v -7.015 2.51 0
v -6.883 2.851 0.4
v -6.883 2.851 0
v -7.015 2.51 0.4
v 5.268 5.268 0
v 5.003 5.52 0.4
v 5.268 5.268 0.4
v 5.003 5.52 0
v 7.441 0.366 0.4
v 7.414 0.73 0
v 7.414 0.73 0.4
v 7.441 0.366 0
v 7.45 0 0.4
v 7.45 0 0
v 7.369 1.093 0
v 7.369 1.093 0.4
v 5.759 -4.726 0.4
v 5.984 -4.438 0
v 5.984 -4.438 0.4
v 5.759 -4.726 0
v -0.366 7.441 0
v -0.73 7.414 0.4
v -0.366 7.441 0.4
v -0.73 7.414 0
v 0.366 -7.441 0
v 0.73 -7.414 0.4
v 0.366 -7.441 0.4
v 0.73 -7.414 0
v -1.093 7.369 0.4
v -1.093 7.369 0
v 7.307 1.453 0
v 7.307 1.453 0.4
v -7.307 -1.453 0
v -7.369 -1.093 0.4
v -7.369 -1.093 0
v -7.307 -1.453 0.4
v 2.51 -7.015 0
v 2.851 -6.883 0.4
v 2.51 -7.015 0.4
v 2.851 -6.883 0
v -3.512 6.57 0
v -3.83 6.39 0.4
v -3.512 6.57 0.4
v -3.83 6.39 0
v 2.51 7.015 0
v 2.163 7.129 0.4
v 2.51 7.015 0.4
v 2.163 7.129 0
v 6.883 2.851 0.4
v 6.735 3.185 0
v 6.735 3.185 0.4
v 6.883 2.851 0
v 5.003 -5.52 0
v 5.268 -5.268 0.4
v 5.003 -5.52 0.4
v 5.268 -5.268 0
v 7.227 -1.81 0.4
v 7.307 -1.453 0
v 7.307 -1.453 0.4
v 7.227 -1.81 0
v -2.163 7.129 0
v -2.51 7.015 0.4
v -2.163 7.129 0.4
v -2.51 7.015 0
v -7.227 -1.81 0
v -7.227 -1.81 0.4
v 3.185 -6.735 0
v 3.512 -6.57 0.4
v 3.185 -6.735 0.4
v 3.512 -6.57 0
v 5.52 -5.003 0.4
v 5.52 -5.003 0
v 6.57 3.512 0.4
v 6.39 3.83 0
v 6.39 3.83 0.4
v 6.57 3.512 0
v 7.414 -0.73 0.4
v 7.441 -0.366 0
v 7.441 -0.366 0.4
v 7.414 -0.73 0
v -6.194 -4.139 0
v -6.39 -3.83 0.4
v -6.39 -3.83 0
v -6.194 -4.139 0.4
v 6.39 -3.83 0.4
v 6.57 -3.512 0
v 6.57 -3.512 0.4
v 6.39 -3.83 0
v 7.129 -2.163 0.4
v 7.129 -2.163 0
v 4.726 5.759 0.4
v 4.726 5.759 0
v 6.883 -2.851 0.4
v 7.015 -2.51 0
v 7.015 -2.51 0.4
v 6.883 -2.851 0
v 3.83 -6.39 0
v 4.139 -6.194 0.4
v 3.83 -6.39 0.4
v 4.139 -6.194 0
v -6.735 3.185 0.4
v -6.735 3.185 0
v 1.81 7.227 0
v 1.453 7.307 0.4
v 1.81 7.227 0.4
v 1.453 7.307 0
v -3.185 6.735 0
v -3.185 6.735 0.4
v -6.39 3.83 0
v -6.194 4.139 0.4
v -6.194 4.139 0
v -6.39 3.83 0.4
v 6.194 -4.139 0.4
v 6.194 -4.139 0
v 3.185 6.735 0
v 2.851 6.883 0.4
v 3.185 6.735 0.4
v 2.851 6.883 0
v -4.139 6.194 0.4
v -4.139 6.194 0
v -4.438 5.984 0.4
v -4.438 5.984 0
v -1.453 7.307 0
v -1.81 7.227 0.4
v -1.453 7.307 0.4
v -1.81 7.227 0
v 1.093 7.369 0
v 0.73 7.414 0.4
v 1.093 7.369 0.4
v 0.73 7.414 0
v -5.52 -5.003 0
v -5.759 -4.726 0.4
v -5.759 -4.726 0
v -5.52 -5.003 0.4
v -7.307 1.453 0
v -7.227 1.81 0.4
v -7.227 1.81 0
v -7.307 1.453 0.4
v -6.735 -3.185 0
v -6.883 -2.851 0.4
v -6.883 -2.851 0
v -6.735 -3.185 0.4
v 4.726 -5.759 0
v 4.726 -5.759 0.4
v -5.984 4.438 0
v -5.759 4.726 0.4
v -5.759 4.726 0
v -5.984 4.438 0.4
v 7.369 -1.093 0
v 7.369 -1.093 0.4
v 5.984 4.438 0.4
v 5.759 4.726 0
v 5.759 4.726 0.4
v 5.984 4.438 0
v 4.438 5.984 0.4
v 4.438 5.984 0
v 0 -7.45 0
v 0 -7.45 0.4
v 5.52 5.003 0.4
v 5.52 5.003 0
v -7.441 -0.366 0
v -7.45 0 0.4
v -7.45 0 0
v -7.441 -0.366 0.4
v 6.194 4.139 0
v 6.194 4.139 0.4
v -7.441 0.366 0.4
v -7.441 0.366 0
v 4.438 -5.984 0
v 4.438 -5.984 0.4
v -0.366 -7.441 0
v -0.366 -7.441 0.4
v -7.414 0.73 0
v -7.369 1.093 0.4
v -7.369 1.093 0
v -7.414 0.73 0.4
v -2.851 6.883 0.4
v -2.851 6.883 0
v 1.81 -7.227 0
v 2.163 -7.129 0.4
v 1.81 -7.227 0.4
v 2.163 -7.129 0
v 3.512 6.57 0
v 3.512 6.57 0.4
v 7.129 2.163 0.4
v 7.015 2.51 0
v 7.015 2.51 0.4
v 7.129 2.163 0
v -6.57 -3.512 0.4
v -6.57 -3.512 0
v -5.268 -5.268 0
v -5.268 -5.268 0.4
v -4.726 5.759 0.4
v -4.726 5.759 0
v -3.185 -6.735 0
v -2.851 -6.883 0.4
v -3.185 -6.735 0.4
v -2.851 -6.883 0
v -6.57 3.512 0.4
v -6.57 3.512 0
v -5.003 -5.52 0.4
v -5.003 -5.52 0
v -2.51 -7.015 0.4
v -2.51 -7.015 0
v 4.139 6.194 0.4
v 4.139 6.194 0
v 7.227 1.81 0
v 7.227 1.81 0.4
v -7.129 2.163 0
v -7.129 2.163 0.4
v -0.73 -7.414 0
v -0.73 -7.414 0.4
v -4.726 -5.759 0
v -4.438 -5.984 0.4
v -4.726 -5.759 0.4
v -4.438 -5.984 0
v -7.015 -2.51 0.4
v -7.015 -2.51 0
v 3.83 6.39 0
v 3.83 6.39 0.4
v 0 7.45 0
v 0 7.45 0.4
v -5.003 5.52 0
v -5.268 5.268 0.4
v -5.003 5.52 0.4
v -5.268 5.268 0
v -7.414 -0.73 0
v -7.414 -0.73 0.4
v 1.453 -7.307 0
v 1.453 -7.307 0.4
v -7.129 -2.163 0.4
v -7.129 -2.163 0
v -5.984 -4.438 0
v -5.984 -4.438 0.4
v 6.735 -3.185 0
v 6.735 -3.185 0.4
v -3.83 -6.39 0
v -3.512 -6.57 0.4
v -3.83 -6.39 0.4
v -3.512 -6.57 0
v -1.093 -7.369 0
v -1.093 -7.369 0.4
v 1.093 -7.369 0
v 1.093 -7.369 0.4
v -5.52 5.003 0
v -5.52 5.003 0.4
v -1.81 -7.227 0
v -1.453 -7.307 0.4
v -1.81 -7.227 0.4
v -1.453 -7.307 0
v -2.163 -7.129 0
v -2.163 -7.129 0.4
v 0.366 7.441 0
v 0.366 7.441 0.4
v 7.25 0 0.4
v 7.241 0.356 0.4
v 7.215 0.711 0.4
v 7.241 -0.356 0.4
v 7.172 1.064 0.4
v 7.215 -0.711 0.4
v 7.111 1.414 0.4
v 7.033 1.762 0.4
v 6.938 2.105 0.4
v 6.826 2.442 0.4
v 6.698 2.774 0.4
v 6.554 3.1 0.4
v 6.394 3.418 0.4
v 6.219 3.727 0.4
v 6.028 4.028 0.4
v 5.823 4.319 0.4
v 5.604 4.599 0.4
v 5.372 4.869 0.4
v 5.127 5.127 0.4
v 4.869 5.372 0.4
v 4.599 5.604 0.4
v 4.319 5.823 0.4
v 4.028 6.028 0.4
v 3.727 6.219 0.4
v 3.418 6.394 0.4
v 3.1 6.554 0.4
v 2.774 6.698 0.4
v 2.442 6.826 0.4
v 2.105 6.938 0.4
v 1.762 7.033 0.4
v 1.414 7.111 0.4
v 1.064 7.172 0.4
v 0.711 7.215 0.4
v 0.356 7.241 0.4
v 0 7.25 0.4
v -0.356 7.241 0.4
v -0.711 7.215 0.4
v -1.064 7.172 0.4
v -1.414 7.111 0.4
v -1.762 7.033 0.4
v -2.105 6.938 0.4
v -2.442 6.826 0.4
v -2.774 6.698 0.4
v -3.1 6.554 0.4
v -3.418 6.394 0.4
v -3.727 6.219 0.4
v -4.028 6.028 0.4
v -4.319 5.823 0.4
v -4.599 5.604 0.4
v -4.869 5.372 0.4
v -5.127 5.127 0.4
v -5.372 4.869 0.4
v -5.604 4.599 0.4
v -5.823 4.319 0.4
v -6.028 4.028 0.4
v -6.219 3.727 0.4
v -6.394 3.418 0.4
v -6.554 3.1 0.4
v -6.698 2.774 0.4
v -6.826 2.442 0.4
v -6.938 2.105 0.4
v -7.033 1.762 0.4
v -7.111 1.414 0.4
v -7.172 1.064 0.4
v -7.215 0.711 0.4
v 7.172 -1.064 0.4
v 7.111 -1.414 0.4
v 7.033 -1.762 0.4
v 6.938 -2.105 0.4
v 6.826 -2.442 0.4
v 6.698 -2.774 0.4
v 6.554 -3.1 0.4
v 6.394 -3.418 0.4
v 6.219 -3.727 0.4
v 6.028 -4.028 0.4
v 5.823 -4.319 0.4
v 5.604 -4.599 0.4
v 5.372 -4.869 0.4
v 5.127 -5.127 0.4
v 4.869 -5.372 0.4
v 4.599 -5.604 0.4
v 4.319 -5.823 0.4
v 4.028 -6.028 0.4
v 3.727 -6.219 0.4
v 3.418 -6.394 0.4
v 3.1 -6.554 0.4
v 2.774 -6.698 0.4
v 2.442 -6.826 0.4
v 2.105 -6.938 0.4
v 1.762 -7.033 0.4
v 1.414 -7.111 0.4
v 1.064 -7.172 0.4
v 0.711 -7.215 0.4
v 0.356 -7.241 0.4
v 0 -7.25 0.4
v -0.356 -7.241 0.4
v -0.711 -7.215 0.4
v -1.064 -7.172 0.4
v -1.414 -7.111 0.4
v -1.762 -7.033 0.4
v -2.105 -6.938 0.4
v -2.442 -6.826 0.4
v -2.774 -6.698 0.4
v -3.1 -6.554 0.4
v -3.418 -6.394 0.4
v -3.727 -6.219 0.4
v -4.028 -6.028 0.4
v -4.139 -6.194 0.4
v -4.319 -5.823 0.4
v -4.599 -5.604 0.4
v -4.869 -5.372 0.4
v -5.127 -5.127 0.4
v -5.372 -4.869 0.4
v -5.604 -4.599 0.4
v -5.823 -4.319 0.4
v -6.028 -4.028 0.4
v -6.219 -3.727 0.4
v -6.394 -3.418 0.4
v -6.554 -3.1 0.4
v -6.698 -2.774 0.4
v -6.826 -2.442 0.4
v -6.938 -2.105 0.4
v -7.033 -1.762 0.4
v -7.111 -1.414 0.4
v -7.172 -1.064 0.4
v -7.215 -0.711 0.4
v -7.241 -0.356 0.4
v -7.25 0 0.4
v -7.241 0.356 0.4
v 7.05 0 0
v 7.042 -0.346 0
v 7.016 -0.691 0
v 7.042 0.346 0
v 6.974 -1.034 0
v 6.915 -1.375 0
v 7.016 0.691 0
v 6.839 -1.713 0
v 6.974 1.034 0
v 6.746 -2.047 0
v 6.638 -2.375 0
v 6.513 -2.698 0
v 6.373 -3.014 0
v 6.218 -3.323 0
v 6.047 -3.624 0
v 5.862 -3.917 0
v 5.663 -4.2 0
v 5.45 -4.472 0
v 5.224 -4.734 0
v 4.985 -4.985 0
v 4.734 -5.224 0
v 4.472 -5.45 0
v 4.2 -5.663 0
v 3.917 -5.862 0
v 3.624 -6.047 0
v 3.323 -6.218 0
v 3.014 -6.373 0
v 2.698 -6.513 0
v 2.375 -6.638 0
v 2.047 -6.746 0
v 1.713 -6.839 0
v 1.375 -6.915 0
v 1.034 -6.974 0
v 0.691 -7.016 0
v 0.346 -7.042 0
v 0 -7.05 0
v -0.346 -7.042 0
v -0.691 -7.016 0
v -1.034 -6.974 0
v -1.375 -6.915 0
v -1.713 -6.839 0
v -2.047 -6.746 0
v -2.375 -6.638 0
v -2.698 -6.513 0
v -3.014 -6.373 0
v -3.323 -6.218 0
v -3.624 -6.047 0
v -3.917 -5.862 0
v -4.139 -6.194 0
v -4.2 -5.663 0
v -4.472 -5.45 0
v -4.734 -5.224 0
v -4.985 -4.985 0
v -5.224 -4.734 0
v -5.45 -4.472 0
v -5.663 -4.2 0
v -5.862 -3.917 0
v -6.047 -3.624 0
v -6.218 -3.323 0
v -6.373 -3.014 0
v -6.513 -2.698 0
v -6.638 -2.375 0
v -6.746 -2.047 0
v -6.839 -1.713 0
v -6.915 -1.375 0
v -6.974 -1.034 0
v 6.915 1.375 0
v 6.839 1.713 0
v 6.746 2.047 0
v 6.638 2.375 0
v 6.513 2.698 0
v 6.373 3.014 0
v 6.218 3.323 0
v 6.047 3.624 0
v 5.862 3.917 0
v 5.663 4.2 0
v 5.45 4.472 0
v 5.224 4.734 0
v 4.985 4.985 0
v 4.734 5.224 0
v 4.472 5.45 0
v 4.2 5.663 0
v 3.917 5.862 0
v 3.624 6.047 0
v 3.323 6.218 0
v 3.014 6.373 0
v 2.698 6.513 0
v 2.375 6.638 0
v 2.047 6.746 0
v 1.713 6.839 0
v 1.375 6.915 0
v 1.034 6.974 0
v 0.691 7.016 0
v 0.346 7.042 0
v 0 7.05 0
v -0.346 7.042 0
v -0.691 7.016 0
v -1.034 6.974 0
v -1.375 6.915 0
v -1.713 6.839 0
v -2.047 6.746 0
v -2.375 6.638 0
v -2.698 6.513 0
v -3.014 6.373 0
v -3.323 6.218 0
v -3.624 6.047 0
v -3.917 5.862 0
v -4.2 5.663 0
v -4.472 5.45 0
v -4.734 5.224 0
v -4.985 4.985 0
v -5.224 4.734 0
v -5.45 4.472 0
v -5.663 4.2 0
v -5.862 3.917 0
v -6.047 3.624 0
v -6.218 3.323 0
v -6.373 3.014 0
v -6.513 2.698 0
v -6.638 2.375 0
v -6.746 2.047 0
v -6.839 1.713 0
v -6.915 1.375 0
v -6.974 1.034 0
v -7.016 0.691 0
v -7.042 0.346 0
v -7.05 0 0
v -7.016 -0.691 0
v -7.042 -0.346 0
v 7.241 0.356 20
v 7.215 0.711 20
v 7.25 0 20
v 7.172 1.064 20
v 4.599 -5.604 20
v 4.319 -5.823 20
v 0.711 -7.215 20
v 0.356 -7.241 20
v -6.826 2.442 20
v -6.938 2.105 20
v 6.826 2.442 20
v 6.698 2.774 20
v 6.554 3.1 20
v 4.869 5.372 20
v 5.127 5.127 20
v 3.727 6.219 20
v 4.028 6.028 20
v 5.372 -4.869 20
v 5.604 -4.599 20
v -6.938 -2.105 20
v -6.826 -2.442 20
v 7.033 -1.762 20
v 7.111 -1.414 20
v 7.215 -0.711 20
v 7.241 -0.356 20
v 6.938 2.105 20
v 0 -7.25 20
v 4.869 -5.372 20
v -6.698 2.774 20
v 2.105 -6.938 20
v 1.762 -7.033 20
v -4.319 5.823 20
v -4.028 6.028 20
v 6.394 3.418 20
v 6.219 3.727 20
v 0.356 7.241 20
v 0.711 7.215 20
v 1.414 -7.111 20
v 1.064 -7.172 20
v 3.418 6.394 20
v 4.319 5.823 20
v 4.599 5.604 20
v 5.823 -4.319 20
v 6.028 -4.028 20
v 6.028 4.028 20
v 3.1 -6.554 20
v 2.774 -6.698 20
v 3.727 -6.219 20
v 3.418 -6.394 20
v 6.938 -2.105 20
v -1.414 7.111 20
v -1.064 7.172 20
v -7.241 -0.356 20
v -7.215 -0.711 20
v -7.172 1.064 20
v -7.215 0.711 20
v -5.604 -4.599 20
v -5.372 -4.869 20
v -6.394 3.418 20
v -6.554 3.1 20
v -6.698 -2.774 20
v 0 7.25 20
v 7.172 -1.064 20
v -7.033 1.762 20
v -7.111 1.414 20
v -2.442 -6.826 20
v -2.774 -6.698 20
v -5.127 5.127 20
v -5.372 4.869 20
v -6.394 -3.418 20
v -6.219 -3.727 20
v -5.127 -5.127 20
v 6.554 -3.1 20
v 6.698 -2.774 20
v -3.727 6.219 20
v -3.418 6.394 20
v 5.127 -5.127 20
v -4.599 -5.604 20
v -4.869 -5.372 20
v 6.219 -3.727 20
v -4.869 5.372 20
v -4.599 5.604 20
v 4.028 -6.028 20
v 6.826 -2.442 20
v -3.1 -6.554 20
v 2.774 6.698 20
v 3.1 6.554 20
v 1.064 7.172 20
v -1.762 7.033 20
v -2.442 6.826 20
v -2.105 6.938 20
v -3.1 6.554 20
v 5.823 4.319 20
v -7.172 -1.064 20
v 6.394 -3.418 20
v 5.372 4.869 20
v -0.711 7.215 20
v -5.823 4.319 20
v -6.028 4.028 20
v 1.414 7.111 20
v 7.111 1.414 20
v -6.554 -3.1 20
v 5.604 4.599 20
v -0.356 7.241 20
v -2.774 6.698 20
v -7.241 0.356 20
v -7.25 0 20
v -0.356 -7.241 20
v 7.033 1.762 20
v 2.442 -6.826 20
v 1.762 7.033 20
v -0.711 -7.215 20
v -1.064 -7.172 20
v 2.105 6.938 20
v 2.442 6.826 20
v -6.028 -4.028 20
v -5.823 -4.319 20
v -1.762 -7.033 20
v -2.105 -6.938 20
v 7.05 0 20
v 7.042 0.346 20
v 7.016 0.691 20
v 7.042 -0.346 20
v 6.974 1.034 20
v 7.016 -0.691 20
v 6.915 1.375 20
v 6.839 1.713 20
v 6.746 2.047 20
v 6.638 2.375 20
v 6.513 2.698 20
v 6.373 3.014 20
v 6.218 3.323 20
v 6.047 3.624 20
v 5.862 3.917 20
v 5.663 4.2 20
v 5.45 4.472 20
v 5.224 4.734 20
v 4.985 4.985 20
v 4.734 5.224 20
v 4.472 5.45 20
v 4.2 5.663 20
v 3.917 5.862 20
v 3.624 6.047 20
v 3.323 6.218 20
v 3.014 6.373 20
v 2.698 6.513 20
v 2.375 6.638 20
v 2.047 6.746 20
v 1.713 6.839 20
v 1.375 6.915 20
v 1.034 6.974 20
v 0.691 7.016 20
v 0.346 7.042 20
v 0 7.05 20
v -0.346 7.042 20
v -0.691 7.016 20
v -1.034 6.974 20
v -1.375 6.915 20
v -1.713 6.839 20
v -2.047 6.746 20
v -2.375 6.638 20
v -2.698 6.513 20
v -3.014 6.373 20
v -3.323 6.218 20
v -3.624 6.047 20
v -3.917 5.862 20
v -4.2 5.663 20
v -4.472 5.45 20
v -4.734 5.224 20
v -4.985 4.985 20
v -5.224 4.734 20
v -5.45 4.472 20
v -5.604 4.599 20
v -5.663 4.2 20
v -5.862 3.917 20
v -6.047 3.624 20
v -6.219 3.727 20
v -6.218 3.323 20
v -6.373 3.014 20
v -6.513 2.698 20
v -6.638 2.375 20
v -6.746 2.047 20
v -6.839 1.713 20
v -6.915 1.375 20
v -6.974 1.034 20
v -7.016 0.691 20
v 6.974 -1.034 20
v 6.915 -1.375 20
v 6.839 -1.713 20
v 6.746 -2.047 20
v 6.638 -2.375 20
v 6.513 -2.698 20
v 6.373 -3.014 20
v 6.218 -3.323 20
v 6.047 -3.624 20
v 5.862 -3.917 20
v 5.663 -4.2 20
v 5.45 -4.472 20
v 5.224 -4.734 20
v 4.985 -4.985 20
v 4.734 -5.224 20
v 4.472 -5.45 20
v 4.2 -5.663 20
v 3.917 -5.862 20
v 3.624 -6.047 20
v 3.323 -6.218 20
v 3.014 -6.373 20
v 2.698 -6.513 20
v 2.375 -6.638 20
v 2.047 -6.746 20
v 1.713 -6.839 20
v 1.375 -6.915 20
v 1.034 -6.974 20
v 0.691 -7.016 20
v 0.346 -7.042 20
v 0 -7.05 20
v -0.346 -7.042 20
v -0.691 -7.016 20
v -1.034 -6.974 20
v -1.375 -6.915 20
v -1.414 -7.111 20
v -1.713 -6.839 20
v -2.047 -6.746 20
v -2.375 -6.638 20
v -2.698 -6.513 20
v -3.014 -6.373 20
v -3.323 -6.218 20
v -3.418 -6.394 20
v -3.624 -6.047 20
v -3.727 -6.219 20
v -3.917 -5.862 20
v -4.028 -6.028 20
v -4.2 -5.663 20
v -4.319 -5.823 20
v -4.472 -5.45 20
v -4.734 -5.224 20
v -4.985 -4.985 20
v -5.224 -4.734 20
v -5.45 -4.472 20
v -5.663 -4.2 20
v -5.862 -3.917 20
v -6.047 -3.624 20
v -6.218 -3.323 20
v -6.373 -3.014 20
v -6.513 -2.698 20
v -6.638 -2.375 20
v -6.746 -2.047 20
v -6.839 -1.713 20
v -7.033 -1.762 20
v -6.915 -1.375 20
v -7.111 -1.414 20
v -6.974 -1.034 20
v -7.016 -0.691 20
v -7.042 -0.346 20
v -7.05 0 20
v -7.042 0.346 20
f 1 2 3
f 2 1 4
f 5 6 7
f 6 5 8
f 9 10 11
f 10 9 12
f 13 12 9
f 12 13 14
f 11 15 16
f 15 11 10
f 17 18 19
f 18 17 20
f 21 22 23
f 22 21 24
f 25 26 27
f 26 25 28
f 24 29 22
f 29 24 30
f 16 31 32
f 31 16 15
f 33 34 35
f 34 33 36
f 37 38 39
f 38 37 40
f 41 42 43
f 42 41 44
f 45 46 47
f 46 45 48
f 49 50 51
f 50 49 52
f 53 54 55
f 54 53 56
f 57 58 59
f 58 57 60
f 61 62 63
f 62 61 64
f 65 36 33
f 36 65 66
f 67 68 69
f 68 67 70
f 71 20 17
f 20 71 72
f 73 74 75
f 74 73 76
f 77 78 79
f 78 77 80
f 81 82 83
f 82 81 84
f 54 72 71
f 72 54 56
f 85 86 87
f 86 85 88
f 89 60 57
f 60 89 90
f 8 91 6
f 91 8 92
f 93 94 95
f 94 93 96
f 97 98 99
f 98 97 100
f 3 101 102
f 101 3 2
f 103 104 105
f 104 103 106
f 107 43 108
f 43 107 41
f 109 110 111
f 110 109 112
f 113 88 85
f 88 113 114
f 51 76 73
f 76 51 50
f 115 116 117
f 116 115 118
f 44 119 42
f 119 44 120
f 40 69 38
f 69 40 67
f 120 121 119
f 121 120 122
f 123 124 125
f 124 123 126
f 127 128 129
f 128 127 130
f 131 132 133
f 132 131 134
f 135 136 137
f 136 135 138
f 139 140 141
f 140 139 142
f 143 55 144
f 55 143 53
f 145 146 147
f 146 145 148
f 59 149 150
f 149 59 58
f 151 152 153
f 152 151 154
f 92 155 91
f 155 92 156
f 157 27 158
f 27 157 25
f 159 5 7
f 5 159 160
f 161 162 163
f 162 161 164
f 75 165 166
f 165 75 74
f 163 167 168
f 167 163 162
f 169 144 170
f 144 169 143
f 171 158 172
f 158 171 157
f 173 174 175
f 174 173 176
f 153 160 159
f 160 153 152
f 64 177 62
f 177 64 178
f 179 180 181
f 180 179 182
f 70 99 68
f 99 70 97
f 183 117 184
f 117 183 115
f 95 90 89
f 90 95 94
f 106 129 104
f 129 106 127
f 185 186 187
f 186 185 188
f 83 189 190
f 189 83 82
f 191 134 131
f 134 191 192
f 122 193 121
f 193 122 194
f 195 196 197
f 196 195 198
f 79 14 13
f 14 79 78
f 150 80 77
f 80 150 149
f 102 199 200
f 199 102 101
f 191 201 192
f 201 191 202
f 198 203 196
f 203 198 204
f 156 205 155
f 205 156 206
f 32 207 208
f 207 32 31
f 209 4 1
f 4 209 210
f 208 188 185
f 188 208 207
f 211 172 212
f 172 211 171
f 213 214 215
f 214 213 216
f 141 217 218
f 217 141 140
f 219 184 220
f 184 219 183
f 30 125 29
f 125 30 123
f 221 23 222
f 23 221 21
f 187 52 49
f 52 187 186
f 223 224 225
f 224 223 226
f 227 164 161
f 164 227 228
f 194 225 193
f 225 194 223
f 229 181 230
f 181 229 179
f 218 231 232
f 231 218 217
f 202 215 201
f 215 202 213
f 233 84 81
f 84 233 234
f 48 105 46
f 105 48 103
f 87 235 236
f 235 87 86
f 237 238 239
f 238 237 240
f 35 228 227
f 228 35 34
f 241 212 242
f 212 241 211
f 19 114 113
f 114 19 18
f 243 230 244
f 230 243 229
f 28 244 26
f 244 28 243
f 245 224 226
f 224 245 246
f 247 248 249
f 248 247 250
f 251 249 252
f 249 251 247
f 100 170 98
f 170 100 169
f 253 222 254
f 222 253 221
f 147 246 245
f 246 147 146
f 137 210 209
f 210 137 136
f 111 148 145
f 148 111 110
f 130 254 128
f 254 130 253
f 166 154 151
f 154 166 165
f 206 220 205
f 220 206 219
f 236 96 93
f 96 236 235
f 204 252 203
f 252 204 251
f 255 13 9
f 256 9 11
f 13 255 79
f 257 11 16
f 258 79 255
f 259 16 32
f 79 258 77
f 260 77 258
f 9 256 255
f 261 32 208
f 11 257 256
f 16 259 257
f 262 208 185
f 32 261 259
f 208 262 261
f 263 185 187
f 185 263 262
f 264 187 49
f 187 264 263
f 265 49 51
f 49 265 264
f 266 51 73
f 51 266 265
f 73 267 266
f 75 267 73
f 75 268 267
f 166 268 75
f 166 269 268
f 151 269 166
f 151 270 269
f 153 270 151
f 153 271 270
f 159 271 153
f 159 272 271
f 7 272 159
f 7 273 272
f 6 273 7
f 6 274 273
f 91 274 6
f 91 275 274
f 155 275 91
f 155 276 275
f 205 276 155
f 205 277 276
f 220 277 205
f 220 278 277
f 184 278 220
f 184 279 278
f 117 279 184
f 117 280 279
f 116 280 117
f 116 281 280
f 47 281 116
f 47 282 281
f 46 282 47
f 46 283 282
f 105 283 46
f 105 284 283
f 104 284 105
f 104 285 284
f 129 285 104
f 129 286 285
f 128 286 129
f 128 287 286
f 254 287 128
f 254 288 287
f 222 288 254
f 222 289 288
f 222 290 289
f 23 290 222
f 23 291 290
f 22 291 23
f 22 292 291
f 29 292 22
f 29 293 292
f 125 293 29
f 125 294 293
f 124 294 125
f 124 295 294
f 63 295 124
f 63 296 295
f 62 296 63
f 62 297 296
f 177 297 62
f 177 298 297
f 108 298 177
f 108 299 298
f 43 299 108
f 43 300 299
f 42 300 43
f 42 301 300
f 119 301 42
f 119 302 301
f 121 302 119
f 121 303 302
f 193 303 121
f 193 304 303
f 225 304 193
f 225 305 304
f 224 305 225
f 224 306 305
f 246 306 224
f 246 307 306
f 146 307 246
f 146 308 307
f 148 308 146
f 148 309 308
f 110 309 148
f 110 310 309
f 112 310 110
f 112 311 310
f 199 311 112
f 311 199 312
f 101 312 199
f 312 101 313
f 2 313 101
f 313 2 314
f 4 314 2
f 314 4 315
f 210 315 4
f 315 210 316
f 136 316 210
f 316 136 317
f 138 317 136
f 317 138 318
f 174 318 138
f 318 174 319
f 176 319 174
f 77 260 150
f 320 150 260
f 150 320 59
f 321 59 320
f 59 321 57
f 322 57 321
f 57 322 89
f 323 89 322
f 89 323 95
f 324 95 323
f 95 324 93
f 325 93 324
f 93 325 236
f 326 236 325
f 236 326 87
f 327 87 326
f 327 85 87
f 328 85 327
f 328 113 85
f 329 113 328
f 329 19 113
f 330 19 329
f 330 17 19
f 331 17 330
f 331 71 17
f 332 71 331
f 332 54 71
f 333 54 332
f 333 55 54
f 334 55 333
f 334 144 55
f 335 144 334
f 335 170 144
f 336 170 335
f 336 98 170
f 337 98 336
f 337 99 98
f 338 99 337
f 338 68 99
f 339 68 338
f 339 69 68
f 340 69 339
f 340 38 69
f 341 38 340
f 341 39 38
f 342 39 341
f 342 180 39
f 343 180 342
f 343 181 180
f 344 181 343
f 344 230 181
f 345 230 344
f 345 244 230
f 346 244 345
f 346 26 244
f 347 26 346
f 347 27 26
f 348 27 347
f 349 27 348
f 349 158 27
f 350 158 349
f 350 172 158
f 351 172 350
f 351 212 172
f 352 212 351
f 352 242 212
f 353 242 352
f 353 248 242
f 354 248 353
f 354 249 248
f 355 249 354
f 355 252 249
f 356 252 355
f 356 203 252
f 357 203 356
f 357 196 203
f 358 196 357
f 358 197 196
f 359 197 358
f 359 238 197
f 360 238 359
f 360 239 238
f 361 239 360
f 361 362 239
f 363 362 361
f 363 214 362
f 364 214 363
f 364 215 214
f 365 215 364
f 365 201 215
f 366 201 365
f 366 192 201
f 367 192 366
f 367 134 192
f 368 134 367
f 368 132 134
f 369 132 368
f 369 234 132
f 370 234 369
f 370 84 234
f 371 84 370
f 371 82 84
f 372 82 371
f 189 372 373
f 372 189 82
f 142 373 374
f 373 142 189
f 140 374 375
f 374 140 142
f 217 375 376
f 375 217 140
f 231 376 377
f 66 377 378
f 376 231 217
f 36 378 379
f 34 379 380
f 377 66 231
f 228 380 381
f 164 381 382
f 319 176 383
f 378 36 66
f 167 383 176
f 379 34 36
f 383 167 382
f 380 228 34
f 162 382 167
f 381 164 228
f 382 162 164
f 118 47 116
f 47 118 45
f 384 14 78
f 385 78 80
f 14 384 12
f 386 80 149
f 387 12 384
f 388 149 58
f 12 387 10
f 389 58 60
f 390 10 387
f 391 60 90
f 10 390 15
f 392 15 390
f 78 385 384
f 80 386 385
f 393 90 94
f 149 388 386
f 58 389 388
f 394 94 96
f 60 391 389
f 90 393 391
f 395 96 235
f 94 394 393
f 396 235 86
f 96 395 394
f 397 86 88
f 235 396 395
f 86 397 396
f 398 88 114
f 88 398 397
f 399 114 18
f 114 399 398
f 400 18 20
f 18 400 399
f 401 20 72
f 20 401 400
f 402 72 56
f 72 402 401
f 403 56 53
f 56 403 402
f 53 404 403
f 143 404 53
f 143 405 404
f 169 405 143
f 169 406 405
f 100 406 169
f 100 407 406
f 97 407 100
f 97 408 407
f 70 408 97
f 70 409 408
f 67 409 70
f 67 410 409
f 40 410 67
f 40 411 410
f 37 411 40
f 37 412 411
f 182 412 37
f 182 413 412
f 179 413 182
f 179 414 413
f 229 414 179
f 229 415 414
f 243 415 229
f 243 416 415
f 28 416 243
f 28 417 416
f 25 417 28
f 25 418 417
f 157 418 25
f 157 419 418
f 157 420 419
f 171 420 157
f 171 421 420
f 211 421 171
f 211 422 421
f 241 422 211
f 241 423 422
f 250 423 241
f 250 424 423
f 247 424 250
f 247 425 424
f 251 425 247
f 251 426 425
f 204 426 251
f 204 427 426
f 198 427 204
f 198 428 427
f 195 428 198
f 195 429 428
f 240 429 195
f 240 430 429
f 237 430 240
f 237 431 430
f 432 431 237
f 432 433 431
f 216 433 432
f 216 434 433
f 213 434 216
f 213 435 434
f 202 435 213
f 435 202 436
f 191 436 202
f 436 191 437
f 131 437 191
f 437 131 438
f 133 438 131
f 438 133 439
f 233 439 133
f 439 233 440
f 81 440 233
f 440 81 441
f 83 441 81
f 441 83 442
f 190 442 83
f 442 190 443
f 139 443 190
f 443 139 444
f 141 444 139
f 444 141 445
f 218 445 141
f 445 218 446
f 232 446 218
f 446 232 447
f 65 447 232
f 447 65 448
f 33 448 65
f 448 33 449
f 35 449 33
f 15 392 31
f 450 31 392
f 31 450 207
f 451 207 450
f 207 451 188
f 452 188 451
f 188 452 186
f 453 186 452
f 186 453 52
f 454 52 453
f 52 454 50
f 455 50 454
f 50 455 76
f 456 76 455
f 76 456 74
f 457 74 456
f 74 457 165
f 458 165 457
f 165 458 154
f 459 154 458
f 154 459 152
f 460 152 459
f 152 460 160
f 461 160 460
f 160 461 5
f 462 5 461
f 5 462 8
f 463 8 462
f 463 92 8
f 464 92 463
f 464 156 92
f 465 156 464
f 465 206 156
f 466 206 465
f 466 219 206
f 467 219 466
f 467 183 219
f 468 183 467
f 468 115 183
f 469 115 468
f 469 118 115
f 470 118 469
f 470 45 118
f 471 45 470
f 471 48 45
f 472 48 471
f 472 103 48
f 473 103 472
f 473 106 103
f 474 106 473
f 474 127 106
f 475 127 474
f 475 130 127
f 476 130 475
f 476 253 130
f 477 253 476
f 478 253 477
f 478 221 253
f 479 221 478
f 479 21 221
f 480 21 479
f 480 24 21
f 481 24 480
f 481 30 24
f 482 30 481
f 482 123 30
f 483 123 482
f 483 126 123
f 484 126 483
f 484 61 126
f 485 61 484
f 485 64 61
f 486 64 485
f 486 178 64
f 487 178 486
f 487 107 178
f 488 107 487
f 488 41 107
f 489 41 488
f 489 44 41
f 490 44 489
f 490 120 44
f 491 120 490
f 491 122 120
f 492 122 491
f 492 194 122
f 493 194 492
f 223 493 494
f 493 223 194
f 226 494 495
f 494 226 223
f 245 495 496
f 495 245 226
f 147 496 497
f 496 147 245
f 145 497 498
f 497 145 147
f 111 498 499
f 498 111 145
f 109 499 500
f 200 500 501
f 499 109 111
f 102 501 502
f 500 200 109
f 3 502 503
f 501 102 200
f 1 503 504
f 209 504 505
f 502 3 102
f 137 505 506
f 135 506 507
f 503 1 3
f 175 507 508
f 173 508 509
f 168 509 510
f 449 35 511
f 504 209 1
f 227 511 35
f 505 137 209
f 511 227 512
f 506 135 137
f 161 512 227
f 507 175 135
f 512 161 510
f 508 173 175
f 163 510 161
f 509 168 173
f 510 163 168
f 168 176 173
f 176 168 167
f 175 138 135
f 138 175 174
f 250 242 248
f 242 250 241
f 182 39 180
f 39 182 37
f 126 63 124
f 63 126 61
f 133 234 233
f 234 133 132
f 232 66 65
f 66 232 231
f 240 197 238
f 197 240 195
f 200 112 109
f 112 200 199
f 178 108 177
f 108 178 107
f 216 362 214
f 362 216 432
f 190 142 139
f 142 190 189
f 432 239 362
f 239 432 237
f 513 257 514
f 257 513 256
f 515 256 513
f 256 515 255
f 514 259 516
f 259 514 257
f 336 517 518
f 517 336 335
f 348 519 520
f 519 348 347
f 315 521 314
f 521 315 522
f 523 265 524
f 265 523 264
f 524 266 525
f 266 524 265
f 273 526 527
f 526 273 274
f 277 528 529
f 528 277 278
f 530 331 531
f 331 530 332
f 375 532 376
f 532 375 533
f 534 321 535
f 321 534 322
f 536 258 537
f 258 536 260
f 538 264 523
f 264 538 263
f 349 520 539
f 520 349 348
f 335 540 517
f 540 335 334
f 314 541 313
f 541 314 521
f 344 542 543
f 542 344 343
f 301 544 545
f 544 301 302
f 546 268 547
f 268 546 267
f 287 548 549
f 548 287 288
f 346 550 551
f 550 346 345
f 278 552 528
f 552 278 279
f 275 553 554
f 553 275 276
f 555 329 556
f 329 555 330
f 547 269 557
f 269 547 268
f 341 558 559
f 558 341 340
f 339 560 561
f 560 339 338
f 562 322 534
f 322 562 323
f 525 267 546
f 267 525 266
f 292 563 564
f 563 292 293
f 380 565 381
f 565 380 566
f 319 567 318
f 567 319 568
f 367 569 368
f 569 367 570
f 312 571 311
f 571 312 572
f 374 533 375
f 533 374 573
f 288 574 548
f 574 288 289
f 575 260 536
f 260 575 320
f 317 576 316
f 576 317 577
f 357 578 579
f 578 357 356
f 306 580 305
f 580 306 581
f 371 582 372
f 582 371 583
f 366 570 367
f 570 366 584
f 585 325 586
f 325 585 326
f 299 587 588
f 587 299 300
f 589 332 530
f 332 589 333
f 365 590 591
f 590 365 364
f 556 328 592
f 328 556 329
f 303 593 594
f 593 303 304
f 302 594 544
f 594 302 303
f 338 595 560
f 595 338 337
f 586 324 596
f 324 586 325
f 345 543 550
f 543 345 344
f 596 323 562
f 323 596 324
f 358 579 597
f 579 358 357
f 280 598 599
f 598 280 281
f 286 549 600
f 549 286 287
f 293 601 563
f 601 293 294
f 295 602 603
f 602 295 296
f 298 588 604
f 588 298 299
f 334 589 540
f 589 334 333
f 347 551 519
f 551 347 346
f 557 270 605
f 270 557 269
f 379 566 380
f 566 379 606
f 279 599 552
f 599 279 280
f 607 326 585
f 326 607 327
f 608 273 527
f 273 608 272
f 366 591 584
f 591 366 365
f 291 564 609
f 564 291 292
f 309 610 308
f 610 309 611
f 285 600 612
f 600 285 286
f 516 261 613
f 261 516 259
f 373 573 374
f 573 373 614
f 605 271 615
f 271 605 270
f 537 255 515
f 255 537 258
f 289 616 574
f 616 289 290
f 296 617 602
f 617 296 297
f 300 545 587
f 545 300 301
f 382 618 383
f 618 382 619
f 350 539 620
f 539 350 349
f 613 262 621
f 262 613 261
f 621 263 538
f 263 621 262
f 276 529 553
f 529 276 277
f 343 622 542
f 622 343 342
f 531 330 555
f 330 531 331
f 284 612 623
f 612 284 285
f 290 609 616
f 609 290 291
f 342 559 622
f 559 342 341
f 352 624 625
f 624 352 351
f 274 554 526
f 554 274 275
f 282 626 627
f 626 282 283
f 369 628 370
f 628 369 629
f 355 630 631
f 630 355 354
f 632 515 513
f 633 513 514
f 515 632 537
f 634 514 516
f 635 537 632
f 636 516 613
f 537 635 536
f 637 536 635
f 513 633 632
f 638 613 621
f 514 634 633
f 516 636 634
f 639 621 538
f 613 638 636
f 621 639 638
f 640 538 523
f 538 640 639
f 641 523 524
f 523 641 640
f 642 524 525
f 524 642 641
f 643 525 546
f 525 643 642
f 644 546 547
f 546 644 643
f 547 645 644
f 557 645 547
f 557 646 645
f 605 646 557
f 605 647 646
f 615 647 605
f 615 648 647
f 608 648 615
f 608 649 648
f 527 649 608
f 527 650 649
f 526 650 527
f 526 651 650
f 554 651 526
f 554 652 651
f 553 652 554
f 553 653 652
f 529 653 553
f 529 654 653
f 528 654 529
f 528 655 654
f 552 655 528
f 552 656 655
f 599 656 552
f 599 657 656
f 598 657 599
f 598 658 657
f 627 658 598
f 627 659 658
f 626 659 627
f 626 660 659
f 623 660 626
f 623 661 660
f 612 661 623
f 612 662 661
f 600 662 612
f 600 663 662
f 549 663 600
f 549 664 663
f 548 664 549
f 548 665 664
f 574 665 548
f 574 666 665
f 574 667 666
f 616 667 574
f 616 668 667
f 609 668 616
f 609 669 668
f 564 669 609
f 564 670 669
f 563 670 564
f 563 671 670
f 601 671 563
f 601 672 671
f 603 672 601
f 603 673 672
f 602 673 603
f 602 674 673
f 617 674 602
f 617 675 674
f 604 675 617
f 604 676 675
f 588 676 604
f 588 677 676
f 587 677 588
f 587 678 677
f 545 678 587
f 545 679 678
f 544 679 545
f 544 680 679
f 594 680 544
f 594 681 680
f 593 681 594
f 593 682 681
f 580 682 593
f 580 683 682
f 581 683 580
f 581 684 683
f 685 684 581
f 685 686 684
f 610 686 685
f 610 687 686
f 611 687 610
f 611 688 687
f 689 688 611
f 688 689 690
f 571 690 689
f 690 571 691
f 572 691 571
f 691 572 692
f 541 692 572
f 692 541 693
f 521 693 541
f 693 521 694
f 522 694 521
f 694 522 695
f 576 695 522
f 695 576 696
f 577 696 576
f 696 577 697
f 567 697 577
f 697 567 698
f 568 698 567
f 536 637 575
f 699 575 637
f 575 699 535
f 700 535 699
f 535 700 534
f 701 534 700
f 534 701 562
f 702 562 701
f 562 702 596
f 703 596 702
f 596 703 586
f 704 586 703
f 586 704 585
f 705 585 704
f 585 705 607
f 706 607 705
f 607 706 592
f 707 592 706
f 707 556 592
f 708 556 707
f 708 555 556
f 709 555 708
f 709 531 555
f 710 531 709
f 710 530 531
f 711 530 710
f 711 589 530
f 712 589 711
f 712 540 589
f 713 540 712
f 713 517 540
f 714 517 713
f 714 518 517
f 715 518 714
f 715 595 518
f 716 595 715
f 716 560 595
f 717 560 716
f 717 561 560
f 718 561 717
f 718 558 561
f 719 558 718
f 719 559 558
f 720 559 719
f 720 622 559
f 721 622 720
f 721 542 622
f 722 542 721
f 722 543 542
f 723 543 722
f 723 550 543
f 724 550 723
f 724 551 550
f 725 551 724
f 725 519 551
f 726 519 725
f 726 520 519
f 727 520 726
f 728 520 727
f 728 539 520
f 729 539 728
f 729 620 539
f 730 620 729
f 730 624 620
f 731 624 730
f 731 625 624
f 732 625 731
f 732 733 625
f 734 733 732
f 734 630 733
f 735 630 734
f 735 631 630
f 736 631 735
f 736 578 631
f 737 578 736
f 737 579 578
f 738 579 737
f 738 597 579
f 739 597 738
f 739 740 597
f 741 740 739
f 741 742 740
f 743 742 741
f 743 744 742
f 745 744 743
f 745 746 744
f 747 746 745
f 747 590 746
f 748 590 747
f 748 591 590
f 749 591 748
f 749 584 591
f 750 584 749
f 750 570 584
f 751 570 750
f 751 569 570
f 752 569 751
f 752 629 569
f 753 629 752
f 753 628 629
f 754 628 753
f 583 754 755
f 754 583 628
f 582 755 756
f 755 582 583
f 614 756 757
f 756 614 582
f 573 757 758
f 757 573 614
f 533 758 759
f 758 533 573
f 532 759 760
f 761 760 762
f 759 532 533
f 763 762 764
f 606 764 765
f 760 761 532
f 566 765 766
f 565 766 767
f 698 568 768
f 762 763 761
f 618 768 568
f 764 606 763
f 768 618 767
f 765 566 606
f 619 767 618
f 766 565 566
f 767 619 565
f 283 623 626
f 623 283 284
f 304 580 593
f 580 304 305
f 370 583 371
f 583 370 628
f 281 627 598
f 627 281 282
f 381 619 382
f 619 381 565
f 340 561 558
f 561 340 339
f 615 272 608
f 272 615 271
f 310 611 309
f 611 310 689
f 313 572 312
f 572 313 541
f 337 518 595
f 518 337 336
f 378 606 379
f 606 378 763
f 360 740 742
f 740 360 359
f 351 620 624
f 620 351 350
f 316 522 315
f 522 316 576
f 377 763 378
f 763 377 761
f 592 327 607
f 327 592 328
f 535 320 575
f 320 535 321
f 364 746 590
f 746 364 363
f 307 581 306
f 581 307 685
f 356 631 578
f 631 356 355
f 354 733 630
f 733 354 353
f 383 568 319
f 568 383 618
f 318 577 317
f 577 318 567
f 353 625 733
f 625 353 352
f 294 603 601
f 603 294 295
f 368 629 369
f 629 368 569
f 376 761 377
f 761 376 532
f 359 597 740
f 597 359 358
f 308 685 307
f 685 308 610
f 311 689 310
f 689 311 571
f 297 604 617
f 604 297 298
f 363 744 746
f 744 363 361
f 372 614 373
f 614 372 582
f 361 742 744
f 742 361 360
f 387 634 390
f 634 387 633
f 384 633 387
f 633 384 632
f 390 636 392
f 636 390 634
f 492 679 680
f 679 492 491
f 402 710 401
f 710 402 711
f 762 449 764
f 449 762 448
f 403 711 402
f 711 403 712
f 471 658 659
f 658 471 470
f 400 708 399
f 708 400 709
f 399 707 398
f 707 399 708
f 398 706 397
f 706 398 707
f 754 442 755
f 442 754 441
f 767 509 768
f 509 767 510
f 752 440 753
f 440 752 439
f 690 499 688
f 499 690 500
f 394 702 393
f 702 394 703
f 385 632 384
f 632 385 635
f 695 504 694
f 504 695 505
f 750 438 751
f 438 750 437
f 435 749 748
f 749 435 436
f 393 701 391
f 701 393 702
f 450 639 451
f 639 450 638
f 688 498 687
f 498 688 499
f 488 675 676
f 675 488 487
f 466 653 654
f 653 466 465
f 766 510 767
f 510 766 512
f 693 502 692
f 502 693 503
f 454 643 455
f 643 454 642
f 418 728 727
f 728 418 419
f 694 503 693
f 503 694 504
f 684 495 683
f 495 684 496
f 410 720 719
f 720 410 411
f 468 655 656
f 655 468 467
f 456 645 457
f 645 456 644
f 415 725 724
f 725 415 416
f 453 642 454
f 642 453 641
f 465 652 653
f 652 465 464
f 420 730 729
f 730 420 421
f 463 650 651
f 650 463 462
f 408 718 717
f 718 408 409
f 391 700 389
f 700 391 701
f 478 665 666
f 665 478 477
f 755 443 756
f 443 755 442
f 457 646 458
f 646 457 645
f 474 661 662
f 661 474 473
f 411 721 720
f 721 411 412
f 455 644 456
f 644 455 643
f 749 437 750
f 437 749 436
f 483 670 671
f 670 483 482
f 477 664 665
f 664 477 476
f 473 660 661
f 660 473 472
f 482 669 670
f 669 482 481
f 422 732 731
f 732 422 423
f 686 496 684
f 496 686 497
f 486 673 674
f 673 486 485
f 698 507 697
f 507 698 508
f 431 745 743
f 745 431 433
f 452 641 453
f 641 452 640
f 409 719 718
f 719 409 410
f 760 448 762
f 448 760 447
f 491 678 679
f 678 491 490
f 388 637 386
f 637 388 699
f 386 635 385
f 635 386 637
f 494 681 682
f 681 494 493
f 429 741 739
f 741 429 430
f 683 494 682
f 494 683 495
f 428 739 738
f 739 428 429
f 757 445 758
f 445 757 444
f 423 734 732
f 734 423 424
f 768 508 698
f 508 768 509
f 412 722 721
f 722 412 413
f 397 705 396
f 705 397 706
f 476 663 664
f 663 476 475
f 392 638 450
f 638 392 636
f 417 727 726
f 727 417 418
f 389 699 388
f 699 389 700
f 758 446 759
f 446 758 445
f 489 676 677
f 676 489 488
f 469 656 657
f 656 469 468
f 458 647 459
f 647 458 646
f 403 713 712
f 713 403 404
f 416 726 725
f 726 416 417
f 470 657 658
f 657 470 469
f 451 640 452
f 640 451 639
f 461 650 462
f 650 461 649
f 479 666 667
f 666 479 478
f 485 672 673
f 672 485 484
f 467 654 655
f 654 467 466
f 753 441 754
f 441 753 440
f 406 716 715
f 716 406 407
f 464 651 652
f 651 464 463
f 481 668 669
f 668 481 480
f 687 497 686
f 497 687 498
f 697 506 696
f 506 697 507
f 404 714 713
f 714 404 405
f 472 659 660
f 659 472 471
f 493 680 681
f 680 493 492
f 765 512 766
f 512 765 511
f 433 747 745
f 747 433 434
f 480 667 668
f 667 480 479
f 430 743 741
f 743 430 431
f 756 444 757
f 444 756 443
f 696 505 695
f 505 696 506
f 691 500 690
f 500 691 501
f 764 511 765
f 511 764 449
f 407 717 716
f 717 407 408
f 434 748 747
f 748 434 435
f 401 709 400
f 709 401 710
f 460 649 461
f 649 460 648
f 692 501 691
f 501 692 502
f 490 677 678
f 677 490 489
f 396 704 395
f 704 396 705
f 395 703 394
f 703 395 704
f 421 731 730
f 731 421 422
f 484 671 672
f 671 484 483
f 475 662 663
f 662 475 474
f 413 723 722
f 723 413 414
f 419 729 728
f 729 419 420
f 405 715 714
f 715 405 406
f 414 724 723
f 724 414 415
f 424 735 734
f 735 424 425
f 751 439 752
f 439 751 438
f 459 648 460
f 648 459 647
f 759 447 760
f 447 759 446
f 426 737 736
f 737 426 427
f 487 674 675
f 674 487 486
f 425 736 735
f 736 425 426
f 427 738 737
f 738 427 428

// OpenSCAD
$fn=128;
d=14.1;
difference(){
    union(){
        cylinder(h=0.4,d=d+0.8);
        cylinder(h=20,d=d+0.4);
    }
    cylinder(h=120,d=d,center=true);
}
